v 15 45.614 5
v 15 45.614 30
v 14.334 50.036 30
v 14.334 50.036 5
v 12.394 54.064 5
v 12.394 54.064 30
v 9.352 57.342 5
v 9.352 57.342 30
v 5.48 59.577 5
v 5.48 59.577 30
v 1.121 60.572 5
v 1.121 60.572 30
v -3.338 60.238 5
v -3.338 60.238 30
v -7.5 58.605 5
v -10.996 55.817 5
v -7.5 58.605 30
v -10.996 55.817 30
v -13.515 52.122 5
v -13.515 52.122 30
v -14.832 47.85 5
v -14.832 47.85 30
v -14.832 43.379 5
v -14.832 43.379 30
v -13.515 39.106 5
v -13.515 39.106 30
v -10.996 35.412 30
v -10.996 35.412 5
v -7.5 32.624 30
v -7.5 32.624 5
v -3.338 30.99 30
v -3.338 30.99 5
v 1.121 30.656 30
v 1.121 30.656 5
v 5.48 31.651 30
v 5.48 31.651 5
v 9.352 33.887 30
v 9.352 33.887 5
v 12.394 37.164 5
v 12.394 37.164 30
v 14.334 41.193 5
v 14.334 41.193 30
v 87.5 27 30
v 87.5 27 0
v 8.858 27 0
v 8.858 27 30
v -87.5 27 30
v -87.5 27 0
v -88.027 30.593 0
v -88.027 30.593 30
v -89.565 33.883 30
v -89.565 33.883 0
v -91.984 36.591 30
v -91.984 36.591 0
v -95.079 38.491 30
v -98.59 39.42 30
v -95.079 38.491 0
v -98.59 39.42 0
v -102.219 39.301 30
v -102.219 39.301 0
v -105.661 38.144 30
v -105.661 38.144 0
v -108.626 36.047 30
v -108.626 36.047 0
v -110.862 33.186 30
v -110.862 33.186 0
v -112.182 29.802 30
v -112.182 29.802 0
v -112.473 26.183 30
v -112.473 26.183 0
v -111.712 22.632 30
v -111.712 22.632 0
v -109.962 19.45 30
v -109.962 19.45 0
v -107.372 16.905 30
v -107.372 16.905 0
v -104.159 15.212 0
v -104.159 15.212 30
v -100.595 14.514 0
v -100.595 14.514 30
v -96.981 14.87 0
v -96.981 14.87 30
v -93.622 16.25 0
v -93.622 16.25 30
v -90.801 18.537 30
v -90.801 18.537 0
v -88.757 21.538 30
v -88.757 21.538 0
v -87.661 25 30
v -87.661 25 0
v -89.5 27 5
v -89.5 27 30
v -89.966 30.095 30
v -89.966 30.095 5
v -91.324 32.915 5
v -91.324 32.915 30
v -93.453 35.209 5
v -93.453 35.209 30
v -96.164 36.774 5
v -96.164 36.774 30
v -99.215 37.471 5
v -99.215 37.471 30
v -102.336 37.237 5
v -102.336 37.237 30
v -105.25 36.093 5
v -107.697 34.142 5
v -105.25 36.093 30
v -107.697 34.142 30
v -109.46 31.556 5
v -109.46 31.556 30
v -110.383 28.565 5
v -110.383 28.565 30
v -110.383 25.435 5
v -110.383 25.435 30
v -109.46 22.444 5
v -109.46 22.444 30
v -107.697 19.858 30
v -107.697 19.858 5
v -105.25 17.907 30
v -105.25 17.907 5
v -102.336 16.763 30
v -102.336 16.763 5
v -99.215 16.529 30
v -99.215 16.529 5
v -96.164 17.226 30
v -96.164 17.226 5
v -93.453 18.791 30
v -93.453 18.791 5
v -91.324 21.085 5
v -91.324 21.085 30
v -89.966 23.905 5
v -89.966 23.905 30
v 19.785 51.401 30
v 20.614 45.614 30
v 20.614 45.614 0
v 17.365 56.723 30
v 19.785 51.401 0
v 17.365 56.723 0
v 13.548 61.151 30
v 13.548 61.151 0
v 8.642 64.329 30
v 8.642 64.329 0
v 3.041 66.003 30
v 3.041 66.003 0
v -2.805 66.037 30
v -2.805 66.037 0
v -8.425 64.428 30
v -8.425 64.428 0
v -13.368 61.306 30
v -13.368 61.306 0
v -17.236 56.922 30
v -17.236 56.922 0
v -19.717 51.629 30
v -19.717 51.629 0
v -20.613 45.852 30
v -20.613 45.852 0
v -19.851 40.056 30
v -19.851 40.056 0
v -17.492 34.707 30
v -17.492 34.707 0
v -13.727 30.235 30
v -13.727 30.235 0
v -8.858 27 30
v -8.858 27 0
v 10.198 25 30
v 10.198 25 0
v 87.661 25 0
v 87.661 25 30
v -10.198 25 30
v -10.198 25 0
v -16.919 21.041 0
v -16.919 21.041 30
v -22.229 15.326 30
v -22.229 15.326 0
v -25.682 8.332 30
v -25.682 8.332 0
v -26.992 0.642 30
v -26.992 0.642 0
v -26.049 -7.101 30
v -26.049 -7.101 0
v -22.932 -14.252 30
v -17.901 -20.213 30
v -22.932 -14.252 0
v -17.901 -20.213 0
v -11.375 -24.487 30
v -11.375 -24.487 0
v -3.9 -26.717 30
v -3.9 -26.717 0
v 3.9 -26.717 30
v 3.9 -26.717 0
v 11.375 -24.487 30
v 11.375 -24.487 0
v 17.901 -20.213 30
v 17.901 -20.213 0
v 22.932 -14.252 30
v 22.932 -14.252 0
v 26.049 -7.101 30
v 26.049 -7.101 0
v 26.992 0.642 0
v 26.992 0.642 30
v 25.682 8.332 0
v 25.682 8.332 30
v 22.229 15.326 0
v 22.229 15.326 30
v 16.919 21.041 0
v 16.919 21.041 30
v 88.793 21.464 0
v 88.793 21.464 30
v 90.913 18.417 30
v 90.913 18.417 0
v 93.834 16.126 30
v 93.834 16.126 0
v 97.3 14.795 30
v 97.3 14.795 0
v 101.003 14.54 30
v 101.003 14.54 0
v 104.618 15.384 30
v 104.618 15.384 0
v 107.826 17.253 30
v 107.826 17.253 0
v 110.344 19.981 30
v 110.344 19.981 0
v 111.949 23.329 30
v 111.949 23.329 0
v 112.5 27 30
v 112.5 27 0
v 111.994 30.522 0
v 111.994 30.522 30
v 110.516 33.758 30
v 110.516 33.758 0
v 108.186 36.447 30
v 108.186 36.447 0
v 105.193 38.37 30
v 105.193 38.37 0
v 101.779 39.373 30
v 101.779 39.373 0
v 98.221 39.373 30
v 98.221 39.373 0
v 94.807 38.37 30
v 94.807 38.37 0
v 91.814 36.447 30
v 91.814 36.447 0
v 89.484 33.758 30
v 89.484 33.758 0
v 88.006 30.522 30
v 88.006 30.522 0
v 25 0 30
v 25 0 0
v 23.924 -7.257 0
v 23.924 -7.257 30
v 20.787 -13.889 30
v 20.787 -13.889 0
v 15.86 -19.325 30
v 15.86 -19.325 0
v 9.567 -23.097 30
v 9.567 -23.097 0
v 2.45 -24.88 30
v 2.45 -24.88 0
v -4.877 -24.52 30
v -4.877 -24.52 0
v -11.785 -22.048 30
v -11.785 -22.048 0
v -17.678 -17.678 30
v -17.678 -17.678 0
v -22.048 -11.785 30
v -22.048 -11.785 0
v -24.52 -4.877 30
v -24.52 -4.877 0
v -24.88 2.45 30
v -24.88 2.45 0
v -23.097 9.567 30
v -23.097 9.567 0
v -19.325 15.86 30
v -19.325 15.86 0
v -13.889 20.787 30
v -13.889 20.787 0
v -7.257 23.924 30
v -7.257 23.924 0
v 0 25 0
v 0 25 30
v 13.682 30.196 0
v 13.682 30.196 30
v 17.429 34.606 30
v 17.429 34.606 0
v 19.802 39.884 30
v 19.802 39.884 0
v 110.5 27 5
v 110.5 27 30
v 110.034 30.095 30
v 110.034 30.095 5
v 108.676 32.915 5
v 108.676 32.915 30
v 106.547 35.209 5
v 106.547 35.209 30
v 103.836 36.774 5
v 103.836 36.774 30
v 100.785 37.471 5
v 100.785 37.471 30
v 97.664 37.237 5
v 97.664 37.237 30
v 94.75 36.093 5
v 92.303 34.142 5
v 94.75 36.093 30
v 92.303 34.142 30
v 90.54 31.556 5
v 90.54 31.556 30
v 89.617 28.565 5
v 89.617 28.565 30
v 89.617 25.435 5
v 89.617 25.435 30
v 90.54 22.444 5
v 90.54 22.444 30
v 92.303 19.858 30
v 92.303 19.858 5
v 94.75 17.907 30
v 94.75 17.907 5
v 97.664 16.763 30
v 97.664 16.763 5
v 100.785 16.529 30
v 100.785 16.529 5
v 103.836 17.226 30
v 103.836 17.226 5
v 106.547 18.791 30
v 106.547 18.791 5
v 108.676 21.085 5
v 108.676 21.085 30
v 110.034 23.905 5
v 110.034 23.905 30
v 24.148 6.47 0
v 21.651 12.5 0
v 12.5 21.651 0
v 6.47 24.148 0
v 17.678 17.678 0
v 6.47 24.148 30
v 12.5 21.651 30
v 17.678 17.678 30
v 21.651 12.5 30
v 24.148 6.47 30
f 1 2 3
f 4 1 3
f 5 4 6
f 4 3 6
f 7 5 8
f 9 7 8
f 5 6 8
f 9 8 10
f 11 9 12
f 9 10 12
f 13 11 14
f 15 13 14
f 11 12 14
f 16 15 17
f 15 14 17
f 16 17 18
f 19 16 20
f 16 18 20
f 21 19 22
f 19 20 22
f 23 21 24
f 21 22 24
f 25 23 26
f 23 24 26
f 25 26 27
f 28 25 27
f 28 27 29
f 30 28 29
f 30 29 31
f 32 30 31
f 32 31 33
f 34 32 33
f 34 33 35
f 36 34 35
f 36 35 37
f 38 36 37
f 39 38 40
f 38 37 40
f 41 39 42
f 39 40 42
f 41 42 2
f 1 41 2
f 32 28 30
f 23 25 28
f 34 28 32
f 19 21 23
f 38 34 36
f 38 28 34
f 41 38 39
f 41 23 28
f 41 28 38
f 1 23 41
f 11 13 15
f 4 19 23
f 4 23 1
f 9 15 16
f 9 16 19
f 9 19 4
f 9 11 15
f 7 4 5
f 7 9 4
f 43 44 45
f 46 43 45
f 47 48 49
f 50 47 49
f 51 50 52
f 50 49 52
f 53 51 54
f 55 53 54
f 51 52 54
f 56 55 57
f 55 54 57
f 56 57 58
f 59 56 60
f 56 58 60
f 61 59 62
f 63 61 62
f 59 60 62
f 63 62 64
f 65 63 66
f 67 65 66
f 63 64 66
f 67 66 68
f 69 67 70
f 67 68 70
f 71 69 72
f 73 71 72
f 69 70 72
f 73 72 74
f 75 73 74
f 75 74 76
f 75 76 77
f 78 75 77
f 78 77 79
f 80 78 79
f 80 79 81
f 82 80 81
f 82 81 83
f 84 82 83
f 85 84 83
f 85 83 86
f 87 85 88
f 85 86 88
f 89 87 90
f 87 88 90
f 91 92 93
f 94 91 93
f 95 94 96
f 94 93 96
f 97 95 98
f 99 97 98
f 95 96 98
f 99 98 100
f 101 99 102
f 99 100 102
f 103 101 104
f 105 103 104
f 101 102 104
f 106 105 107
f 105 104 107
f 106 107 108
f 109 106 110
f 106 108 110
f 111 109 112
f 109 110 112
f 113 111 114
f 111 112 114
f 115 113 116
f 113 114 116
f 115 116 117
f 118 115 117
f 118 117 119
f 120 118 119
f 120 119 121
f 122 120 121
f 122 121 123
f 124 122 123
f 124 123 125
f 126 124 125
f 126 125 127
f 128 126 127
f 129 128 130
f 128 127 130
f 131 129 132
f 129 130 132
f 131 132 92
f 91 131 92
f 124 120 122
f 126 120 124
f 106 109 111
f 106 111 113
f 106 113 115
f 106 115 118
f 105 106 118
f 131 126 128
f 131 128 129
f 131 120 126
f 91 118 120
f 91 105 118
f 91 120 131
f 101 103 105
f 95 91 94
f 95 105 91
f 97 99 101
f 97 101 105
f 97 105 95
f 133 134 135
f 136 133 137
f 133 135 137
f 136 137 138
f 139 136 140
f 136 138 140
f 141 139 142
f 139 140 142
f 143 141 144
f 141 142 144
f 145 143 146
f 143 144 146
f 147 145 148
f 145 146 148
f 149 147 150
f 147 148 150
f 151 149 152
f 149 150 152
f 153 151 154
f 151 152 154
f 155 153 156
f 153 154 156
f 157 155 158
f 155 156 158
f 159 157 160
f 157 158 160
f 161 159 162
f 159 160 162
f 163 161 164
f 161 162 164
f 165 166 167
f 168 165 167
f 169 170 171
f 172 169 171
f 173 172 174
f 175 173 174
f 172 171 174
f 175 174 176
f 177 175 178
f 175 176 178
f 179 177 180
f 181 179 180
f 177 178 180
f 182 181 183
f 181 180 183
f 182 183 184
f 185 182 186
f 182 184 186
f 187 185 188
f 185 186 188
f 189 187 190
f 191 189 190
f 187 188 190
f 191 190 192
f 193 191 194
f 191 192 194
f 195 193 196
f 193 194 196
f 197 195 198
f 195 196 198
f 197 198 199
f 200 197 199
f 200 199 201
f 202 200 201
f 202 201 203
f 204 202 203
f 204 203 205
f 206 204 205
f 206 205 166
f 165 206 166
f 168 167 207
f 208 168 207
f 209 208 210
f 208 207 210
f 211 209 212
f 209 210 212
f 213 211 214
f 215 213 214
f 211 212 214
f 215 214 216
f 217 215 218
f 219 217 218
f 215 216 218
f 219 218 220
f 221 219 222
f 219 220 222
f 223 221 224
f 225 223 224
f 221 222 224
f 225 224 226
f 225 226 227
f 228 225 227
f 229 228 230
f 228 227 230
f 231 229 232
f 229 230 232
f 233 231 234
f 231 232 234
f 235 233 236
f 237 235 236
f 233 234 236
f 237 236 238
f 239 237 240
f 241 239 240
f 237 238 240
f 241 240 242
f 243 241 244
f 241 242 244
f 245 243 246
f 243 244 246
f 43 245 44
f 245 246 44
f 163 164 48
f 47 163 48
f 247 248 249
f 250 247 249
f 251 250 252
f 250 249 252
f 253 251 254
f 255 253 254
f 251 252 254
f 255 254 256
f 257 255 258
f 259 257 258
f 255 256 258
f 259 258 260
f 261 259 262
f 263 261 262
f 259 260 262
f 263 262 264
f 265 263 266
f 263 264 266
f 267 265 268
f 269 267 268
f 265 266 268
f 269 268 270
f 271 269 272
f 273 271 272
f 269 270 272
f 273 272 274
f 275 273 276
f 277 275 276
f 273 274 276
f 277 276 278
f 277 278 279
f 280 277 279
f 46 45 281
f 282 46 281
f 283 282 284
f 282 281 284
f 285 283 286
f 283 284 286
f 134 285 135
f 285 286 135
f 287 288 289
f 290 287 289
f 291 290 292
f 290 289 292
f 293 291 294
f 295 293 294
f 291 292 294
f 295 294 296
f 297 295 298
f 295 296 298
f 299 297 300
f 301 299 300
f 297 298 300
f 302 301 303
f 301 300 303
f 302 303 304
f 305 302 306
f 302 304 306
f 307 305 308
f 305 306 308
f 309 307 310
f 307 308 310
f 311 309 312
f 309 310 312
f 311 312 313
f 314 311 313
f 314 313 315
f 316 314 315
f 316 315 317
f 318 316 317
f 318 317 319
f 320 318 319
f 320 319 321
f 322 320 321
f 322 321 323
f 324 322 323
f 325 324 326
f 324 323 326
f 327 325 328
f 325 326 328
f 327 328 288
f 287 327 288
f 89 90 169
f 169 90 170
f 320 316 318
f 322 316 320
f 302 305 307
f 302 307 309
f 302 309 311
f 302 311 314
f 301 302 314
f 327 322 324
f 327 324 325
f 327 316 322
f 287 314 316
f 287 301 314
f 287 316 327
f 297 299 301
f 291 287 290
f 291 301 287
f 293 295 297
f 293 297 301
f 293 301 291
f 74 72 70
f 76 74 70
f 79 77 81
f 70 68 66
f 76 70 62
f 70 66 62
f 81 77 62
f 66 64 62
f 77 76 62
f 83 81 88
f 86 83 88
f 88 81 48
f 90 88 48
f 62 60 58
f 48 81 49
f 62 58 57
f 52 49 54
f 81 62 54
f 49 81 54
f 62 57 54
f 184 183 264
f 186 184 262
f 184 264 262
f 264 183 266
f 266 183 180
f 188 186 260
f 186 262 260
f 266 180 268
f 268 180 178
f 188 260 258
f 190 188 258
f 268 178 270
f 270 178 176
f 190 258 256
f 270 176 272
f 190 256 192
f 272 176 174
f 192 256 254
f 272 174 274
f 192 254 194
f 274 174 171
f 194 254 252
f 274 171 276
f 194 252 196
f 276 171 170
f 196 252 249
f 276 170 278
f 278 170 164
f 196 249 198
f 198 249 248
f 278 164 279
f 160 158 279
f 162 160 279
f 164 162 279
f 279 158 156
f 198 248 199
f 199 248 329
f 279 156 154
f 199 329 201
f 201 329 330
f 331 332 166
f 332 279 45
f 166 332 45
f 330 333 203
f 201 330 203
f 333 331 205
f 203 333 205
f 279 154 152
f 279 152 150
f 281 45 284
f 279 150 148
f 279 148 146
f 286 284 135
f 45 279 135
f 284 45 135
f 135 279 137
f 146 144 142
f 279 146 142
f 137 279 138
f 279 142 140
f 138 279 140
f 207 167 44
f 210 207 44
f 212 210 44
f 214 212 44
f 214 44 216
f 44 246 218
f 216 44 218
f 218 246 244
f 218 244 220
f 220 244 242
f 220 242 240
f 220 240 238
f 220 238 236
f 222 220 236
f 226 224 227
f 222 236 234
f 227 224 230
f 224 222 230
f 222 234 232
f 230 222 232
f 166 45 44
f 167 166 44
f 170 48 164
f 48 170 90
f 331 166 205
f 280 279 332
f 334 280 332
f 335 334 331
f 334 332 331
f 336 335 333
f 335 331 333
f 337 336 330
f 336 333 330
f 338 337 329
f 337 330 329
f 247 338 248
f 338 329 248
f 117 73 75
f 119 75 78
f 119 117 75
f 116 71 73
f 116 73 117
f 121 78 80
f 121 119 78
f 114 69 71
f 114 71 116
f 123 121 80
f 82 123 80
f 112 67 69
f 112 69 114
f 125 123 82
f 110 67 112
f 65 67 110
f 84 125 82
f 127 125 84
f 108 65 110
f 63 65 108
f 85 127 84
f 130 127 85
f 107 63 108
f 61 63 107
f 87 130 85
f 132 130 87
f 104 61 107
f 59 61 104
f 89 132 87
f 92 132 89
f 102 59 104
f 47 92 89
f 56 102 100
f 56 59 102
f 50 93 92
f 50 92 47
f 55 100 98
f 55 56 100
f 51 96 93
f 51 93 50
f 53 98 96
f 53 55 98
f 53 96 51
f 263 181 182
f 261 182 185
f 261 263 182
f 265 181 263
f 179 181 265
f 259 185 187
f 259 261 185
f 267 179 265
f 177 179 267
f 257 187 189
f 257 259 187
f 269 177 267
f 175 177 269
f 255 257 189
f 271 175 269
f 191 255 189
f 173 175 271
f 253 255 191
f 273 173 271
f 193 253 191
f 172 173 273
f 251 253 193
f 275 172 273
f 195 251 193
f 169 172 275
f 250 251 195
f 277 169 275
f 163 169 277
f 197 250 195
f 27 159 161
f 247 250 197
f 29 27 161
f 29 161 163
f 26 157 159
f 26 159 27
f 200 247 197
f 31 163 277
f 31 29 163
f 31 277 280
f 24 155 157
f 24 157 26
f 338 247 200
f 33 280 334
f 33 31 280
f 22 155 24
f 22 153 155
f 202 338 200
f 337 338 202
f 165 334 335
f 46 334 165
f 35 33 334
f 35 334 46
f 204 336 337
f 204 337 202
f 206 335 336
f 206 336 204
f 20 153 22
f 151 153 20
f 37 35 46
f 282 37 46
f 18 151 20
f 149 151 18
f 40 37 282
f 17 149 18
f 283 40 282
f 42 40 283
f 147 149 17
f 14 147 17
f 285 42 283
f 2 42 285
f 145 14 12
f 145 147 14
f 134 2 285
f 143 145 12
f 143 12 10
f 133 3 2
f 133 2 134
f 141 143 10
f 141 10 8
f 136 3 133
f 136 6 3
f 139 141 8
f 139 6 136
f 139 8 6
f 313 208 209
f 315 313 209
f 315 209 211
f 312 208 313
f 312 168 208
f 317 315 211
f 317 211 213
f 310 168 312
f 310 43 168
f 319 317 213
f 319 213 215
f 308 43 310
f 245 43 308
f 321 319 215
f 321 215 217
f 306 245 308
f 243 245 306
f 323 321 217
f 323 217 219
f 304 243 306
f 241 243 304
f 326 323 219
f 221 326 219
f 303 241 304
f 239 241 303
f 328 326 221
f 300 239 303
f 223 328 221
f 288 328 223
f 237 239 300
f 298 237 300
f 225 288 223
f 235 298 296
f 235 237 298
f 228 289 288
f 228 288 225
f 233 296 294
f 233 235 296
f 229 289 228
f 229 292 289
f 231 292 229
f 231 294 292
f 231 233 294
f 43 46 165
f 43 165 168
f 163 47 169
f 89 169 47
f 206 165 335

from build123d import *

# Parameters (mm, degrees)
F1_DEPTH = 30
F2_R     = 10.5
F3_DEPTH = 25
F2_R_2   = 15
F4_DEPTH = 25


with BuildPart() as f1:
    # F0 (on Top) → F1 (new body)
    with BuildSketch(Plane.XY):
        with BuildLine():
            ThreePointArc((8.8575914058, 27), (4.5402897901, 25.5062154657), (0, 25))
            ThreePointArc((0, 25), (-4.5402897901, 25.5062154657), (-8.8575914058, 27))
            Line((-8.8575914058, 27), (-87.5, 27))
            ThreePointArc((-87.5, 27), (-87.5403243724, 25.9967636098), (-87.6610373207, 25))
            Line((-87.6610373207, 25), (-10.1980390272, 25))
            ThreePointArc((-10.1980390272, 25), (0, -27), (10.1980390272, 25))
            Line((10.1980390272, 25), (87.6610373207, 25))
            ThreePointArc((87.6610373207, 25), (87.5403243724, 25.9967636098), (87.5, 27))
            Line((87.5, 27), (8.8575914058, 27))
        make_face()
        with BuildLine():
            ThreePointArc((0, 25), (17.6776695297, 17.6776695297), (25, 0))
            ThreePointArc((25, 0), (-17.6776695297, -17.6776695297), (0, 25))
        make_face(mode=Mode.SUBTRACT)
        with BuildLine():
            ThreePointArc((112.5, 27), (100, 39.5), (87.5, 27))
            Line((87.5, 27), (100, 27))
            Line((100, 27), (100, 25))
            Line((100, 25), (87.6610373207, 25))
            ThreePointArc((87.6610373207, 25), (101.0032363902, 14.5403243724), (112.5, 27))
        make_face()
        with BuildLine():
            Line((100, 27), (87.5, 27))
            ThreePointArc((87.5, 27), (87.5403243724, 25.9967636098), (87.6610373207, 25))
            Line((87.6610373207, 25), (100, 25))
            Line((100, 25), (100, 27))
        make_face()
        with BuildLine():
            Line((-100, 27), (-87.5, 27))
            ThreePointArc((-87.5, 27), (-112.4596756276, 28.0032363902), (-87.6610373207, 25))
            Line((-87.6610373207, 25), (-100, 25))
            Line((-100, 25), (-100, 27))
        make_face()
        with BuildLine():
            ThreePointArc((-8.8575914058, 27), (-4.5402897901, 25.5062154657), (0, 25))
            ThreePointArc((0, 25), (4.5402897901, 25.5062154657), (8.8575914058, 27))
            Line((8.8575914058, 27), (0, 27))
            Line((0, 27), (-8.8575914058, 27))
        make_face()
        with BuildLine():
            ThreePointArc((20.6142313778, 45.6142313778), (-11.0080447085, 63.0432154846), (-8.8575914058, 27))
            Line((-8.8575914058, 27), (0, 27))
            Line((0, 27), (8.8575914058, 27))
            ThreePointArc((8.8575914058, 27), (17.4289841068, 34.6061866693), (20.6142313778, 45.6142313778))
        make_face()
        with BuildLine():
            ThreePointArc((-87.6610373207, 25), (-87.5403243724, 25.9967636098), (-87.5, 27))
            Line((-87.5, 27), (-100, 27))
            Line((-100, 27), (-100, 25))
            Line((-100, 25), (-87.6610373207, 25))
        make_face()
    extrude(amount=F1_DEPTH)

    # F2 (on face) → F3 (cut)
    with BuildSketch(Plane.XY.offset(30)):
        with Locations((100, 27)):
            Circle(F2_R)
        with Locations((-100, 27)):
            Circle(F2_R)
    extrude(amount=-F3_DEPTH, mode=Mode.SUBTRACT)

    # F2 (on face) → F4 (cut)
    with BuildSketch(Plane.XY.offset(30)):
        with Locations((0, 45.6142313778)):
            Circle(F2_R_2)
    extrude(amount=-F4_DEPTH, mode=Mode.SUBTRACT)


solid = f1.part
